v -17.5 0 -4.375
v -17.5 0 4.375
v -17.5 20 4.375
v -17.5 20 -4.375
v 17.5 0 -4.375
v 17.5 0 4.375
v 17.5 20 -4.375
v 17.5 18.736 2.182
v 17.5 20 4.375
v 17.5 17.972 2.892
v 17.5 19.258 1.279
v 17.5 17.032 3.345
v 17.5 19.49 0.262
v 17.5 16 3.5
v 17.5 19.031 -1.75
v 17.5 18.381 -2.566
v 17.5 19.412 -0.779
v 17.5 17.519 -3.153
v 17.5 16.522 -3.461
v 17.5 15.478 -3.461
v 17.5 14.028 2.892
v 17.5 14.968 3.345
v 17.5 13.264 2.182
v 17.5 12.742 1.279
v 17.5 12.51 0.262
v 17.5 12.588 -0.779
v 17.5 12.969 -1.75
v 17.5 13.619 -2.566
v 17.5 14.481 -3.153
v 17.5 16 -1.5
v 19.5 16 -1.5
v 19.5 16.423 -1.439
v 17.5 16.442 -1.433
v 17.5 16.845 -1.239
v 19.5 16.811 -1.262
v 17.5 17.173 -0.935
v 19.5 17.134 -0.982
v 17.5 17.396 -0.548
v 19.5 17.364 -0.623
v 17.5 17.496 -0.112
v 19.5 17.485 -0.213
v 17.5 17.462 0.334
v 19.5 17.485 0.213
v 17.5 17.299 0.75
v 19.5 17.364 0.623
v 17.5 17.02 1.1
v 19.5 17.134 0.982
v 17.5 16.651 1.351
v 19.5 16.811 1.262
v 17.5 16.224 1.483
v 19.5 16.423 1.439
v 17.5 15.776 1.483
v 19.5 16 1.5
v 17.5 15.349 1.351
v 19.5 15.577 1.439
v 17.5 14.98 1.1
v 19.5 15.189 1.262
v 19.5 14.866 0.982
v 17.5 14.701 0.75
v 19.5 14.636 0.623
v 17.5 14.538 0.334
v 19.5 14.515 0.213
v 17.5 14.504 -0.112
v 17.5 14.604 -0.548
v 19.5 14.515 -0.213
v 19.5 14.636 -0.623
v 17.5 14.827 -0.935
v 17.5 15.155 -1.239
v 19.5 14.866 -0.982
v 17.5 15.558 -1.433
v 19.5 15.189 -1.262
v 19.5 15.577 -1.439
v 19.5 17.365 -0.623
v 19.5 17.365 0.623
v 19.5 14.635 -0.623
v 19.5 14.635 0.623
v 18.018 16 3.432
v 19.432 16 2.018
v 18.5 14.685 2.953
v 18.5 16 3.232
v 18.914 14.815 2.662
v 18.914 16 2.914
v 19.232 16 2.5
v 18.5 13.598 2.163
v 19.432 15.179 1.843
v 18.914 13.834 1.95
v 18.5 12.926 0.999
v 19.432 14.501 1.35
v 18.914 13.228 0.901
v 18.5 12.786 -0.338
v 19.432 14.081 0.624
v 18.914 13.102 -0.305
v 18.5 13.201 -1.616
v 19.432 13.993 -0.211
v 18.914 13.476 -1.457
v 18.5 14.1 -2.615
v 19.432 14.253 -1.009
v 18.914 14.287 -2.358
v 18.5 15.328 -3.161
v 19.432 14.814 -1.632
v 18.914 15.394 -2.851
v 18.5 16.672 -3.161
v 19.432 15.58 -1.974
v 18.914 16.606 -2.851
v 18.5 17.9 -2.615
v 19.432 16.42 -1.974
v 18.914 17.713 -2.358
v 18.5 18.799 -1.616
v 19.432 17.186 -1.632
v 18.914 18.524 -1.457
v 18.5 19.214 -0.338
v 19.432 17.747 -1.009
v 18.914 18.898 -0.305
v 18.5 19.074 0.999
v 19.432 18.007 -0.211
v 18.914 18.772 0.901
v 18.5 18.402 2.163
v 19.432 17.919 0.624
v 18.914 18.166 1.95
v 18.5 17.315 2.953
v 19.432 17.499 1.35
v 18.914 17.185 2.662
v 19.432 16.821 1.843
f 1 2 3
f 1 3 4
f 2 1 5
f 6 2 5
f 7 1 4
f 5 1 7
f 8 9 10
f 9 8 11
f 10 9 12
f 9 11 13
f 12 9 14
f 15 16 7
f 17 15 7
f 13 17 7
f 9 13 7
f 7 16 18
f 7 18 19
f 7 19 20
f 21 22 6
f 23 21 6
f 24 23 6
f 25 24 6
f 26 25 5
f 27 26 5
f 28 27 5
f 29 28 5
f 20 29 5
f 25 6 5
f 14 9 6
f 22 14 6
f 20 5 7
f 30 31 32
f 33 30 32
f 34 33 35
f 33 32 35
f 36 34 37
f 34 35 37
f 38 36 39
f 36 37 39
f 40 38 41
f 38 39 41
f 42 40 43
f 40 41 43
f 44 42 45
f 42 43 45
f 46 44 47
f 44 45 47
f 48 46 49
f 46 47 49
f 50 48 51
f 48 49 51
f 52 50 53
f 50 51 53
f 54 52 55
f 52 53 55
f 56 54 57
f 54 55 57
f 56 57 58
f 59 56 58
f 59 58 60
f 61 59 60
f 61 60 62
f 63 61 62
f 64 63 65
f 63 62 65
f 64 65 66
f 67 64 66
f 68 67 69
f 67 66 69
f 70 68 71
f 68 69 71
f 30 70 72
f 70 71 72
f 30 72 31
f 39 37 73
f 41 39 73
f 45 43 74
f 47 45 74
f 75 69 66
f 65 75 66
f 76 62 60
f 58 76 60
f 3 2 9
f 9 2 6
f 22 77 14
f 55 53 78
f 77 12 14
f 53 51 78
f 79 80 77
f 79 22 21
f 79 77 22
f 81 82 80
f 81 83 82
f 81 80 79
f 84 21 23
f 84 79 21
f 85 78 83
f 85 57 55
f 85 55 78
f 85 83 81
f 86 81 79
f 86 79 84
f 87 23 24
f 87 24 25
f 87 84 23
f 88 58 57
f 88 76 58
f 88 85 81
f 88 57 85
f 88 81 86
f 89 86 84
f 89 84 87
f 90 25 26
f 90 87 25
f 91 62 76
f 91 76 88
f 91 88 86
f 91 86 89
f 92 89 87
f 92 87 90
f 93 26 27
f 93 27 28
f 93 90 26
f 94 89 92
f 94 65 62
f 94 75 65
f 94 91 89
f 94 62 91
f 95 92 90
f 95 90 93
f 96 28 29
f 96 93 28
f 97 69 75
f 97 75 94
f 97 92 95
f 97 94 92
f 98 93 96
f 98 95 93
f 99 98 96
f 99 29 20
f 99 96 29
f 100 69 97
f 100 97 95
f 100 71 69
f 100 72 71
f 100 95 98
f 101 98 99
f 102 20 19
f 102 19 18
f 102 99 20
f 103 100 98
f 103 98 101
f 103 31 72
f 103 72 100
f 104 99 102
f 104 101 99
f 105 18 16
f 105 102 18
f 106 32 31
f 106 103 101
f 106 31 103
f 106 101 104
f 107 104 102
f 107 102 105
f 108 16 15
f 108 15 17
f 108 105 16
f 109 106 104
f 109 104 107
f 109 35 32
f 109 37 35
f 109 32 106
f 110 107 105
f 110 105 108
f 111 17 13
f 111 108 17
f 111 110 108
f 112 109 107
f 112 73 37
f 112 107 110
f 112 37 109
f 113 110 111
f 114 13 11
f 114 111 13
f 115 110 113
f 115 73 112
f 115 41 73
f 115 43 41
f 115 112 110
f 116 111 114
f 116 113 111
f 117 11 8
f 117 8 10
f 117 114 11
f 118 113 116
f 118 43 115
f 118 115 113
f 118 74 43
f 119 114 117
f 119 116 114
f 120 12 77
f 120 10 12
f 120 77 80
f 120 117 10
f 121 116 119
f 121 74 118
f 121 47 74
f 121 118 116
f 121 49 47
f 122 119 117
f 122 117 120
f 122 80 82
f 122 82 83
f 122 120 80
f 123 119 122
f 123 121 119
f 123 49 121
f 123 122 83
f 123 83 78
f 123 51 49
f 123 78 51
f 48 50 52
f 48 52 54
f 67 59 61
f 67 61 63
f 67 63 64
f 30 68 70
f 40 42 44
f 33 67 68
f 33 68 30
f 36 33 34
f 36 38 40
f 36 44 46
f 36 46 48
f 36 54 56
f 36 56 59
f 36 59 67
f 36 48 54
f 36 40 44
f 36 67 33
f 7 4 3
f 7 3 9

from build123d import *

# Parameters (mm, degrees)
SKETCH1_W           = 35
SKETCH1_H           = 8.75
BOSS_EXTRUDE1_DEPTH = 20
SKETCH2_R           = 3.5
BOSS_EXTRUDE2_DEPTH = 2
SKETCH3_R           = 1.5
CUT_EXTRUDE1_DEPTH  = 2
FILLET1_R           = 2


with BuildPart() as part:
    # Sketch1 → Boss-Extrude1 (new body)
    with BuildSketch(Plane(origin=(0, 0, 0), x_dir=(1, 0, 0), z_dir=(0, 1, 0))):
        Rectangle(SKETCH1_W, SKETCH1_H)
    extrude(amount=BOSS_EXTRUDE1_DEPTH)

    # Sketch2 → Boss-Extrude2 (add)
    with BuildSketch(Plane(origin=(17.5, 0, 0), x_dir=(0, 0, -1), z_dir=(1, 0, 0))):
        with Locations(Location((0, 16, 0), (0, 0, 180))):
            Circle(SKETCH2_R)
    extrude(amount=BOSS_EXTRUDE2_DEPTH)

    # Sketch3 → Cut-Extrude1 (cut)
    with BuildSketch(Plane(origin=(19.5, 0, 0), x_dir=(0, 0, -1), z_dir=(1, 0, 0))):
        with Locations((0, 16)):
            Circle(SKETCH3_R)
    extrude(amount=-CUT_EXTRUDE1_DEPTH, mode=Mode.SUBTRACT)

    # Fillet1
    fillet1_edges = [part.edges().sort_by_distance(p)[0] for p in [
        (19.5, 16, -3.5),
    ]]
    fillet(fillet1_edges, radius=FILLET1_R - 0.0001)  # a hair under: the kernel refuses the full size


solid = part.part
